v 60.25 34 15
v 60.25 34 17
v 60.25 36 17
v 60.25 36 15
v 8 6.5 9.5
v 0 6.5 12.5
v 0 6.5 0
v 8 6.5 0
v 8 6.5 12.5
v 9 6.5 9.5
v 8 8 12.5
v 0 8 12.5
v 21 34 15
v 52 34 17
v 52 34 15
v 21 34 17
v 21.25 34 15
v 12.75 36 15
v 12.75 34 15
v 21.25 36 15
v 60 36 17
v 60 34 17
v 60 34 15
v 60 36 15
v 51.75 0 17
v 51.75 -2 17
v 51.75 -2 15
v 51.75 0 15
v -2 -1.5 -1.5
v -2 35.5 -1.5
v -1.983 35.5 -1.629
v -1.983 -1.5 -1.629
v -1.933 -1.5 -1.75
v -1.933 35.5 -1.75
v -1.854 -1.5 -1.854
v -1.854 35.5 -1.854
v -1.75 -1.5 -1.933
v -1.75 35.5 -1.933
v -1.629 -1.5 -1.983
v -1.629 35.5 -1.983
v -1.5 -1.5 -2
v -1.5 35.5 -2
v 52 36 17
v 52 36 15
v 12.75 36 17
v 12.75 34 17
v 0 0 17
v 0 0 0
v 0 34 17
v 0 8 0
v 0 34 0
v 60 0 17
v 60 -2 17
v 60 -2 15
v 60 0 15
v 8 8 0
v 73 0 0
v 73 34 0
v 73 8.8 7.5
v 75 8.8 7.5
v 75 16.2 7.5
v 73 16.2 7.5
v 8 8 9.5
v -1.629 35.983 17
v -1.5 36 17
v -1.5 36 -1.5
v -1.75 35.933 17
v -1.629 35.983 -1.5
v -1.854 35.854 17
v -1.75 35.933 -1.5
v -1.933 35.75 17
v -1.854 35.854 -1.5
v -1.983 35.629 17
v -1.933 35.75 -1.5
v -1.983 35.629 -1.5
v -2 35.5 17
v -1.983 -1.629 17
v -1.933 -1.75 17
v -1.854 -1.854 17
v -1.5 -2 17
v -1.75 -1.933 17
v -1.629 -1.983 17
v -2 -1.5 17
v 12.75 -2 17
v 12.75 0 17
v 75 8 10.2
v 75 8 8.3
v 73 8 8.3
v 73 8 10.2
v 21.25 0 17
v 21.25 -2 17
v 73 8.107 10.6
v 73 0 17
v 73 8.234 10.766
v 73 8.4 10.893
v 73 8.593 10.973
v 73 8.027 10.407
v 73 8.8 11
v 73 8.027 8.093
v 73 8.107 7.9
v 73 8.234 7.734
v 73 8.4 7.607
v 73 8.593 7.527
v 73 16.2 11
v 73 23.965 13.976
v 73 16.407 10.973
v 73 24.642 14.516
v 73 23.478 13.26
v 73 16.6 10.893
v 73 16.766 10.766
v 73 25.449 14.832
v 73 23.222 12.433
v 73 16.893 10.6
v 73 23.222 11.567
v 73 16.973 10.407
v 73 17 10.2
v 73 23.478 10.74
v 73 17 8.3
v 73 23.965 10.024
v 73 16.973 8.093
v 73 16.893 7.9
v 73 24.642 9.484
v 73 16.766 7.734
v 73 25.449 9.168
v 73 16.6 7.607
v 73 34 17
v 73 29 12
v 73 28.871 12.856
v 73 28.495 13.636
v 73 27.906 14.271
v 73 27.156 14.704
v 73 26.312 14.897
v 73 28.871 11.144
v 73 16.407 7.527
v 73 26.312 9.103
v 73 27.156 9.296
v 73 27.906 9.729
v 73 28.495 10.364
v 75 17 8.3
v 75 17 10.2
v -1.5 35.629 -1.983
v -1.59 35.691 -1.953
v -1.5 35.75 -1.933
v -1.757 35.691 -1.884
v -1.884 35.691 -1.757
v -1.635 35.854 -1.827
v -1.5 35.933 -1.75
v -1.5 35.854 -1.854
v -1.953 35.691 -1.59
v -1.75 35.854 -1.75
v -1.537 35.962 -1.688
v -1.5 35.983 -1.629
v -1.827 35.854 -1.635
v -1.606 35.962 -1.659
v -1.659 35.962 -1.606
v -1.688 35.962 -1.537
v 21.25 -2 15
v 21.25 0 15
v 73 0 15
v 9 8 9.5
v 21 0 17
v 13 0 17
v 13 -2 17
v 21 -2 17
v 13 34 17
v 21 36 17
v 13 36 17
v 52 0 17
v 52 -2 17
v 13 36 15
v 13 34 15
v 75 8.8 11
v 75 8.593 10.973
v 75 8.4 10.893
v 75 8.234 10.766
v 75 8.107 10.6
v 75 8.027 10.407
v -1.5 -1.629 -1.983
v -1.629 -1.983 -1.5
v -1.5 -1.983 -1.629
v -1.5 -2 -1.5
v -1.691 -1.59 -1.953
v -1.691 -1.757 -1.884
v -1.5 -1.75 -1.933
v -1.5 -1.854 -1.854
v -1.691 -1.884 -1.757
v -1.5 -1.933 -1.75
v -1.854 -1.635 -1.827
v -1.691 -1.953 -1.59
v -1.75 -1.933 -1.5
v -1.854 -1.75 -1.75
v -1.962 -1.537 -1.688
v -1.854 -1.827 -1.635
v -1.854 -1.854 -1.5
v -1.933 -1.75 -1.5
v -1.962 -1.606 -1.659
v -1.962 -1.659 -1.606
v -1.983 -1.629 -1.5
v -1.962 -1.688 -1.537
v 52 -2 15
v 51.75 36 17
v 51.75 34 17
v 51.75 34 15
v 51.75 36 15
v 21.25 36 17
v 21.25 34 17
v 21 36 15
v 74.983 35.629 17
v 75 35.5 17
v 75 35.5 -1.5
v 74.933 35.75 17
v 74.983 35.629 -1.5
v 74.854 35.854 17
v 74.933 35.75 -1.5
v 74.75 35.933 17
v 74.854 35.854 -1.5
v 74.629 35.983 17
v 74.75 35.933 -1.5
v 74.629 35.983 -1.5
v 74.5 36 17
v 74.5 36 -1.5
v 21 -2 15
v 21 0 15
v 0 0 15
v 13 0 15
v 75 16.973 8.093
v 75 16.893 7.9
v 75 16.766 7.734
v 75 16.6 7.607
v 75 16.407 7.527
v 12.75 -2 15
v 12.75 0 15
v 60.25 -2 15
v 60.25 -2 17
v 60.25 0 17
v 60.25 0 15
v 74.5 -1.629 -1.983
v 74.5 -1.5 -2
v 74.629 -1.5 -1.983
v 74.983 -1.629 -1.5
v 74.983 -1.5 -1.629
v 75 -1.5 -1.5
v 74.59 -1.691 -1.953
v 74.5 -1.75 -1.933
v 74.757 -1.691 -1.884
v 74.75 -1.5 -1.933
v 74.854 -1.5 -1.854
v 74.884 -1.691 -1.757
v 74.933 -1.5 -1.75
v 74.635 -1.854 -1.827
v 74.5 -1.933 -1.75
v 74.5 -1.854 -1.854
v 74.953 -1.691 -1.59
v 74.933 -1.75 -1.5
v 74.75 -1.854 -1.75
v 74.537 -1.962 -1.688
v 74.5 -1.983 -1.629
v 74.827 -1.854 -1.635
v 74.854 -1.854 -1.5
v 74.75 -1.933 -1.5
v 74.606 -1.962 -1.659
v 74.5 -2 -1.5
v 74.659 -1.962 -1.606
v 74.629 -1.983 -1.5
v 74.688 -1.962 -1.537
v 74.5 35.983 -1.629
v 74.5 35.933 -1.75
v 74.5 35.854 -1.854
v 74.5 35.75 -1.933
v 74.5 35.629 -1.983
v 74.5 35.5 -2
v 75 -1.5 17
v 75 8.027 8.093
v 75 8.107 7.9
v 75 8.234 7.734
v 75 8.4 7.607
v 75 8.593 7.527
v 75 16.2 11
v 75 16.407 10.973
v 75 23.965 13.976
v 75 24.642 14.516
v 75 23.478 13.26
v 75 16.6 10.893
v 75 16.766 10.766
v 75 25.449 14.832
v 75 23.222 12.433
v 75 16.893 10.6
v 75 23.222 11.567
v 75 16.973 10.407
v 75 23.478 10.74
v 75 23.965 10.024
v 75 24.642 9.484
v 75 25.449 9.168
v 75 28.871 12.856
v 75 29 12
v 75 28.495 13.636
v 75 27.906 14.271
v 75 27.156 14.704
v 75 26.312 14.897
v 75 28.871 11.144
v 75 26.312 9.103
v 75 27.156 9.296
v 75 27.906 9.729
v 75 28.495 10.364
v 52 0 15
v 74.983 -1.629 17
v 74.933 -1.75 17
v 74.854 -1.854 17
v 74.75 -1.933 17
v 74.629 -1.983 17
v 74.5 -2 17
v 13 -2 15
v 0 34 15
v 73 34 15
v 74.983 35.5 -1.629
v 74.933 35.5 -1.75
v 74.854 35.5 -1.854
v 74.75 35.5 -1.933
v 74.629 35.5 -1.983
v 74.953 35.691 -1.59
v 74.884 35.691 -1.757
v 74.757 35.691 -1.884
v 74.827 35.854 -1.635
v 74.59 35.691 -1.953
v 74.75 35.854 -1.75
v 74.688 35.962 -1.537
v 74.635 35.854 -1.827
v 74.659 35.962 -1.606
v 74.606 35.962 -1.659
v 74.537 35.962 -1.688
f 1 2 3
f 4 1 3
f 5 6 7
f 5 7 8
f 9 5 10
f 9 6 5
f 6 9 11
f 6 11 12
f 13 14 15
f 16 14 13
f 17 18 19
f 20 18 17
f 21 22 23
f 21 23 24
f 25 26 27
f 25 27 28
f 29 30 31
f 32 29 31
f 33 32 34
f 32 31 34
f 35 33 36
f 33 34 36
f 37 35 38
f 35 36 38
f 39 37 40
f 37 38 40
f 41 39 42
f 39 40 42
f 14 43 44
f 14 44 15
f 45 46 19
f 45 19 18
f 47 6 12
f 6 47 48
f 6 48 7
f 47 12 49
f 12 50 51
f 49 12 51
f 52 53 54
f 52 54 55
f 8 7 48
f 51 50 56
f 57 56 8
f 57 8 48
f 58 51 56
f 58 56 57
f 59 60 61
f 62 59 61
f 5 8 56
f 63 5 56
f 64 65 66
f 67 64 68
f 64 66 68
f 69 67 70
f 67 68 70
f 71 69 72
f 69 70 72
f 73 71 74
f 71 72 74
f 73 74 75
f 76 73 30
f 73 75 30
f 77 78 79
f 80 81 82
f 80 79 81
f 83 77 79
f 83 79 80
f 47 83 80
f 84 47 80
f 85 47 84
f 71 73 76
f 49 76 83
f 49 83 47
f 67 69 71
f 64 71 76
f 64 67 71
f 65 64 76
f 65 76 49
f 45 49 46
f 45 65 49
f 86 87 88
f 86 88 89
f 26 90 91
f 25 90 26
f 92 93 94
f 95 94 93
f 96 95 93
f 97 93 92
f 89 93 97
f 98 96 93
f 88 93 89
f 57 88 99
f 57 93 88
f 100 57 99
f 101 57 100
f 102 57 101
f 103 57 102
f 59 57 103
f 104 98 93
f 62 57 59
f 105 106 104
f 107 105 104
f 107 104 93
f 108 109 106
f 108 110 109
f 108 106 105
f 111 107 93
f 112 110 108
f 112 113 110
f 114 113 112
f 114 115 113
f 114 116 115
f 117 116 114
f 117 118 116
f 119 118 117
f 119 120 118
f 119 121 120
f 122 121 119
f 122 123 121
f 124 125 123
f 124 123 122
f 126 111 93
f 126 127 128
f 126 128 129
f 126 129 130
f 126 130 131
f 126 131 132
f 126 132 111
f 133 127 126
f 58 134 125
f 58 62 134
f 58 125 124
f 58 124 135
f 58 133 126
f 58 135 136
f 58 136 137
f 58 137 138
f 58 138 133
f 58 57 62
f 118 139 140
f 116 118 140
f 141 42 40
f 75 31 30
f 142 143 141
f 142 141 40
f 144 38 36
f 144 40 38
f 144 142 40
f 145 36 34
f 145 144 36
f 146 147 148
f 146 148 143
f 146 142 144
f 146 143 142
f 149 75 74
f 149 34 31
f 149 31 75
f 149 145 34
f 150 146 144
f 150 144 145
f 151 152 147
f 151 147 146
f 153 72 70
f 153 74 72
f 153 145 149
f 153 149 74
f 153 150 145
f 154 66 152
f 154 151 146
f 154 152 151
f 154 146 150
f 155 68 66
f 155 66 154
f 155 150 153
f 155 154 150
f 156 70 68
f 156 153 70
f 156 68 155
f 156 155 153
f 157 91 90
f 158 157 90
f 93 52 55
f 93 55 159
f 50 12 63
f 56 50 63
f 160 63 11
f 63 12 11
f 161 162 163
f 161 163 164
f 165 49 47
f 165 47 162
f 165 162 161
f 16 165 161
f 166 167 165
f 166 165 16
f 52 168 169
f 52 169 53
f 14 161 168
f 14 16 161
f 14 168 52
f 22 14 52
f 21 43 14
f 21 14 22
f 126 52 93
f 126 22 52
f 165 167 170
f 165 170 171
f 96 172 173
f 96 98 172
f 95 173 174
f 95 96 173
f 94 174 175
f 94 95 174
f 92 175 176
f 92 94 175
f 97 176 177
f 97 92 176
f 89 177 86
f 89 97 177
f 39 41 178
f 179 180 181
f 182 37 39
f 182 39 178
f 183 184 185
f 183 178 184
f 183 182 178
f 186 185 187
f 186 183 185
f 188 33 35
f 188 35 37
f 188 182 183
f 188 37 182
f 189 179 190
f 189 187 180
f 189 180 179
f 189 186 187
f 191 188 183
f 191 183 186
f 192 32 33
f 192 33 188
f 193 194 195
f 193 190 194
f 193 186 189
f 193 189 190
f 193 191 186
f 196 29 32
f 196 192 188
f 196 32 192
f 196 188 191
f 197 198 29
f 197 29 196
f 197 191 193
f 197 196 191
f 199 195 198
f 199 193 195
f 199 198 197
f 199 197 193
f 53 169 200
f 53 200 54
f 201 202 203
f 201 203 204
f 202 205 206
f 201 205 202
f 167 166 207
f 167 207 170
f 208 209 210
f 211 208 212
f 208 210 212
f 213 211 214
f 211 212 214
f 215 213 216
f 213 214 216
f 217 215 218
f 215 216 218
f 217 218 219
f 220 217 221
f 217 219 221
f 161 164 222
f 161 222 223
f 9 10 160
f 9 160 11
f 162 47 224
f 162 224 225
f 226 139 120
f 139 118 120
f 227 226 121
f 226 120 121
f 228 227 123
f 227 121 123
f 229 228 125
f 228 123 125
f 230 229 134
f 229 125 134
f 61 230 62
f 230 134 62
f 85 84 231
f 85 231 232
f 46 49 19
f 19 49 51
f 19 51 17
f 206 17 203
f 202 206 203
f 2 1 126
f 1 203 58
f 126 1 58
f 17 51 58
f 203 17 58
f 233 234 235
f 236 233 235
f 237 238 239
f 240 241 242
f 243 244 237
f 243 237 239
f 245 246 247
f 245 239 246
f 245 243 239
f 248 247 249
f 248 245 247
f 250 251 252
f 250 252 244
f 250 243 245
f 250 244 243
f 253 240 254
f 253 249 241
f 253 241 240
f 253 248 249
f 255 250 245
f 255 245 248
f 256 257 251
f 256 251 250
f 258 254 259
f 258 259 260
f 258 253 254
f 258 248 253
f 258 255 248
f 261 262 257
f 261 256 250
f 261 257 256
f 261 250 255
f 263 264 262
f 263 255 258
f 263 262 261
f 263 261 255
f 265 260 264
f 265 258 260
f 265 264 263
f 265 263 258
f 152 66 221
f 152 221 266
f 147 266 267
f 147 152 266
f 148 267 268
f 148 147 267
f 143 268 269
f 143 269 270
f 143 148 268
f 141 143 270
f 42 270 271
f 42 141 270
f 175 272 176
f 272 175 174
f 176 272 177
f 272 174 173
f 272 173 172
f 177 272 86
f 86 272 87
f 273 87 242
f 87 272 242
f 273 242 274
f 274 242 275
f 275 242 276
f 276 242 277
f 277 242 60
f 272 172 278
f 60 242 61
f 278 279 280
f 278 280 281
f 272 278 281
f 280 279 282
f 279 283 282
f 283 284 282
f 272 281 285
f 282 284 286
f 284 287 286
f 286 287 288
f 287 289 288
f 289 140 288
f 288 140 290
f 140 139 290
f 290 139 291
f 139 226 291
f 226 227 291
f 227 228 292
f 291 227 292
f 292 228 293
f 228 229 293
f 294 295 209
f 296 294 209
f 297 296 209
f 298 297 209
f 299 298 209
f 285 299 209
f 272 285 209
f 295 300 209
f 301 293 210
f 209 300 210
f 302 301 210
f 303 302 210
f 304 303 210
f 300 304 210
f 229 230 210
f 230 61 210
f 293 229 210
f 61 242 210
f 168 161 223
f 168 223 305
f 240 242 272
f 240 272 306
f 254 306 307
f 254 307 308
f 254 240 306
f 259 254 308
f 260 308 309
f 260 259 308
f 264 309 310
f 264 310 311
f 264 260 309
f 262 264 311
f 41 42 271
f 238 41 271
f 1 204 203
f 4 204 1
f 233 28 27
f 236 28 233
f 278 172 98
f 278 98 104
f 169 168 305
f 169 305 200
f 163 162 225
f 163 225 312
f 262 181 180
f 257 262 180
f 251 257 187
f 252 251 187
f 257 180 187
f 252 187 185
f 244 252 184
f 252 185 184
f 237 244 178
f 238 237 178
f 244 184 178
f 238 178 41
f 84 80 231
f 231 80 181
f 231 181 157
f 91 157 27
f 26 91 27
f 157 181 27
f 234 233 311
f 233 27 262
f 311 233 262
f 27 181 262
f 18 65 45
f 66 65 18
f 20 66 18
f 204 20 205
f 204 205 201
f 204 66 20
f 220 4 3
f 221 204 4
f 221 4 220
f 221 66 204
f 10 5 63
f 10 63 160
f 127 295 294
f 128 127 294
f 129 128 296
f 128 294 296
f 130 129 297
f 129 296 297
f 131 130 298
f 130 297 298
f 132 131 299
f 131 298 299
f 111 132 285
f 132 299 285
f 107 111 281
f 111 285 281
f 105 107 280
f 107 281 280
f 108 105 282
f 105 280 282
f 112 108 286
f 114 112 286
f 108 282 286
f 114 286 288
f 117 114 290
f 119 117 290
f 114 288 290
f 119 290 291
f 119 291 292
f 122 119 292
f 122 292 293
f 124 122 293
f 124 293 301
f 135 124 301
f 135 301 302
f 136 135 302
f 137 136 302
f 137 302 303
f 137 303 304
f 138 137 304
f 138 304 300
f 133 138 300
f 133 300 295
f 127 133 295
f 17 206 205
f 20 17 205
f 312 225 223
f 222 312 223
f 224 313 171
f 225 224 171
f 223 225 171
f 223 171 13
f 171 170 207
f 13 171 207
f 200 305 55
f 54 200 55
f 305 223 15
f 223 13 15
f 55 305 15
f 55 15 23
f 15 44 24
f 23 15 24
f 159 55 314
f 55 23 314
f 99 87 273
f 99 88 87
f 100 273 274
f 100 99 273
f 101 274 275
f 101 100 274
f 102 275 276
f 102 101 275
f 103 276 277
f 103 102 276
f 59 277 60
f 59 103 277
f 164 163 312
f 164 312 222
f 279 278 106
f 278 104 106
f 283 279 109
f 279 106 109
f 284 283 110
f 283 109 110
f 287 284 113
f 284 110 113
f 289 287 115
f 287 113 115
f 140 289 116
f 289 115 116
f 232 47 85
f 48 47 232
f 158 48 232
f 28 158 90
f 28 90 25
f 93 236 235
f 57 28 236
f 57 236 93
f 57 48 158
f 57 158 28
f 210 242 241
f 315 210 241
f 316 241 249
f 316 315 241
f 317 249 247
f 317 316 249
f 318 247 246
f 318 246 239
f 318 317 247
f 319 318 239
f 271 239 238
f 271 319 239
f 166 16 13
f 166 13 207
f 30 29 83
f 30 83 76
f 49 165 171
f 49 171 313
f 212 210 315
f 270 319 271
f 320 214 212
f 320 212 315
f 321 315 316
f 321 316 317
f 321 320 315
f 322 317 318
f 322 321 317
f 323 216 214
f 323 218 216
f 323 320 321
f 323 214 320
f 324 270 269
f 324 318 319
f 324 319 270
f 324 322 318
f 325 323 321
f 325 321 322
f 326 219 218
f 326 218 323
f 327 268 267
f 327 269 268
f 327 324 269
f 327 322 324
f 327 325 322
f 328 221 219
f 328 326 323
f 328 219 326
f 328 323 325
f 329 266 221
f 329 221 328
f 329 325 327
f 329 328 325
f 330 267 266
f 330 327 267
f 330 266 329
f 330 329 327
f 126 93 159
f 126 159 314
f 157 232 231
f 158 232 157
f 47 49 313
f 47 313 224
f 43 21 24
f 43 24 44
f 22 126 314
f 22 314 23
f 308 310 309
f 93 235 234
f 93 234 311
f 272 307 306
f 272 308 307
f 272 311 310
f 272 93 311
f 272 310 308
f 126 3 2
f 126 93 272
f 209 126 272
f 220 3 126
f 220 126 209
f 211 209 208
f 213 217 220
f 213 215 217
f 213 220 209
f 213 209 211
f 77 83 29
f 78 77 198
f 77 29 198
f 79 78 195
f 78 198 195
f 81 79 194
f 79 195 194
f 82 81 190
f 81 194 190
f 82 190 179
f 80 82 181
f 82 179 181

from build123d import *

# Parameters (mm, degrees)
F0_W         = 73
F0_H         = 34
F1_DEPTH     = 17
F2_T         = 2
F3_W         = 9
F3_H         = 3.5
F4_DEPTH     = 25.4
F5_R         = 2.905
F6_DEPTH     = 25.4
F7_R         = 0.8
F8_T1_DEPTH  = 37
F8_T3_DEPTH  = 19.75
F8_T5_DEPTH  = 76
F8_S9_W      = 0.51
F8_S9_H      = 0.51
F8_T10_DEPTH = 0.51
F8_S15_W     = 0.51
F8_S15_H     = 0.51
F8_T16_DEPTH = 0.51
F8_S21_W     = 0.51
F8_S21_H     = 0.51
F8_T22_DEPTH = 0.51
F8_S27_W     = 0.51
F8_S27_H     = 0.51
F8_T28_DEPTH = 0.51
F9_W         = 8.5
F9_H         = 2
F10_DEPTH    = 2
F12_DEPTH    = 2
F13_W        = 8
F13_H        = 1.5
F14_DEPTH    = 9.5
F16_DEPTH    = 1.5


# Not quite as in the source:
# - a fillet or chamfer that OpenCascade refuses, or shapes differently, is made with other operations: its cross-section is extruded or revolved along the edge and cut away or added


with BuildPart() as f1:
    # F0 (on Top) → F1 (new body)
    with BuildSketch(Plane.XY):
        with Locations((36.5, 17)):
            Rectangle(F0_W, F0_H)
    extrude(amount=F1_DEPTH)

    # F2
    f2_openings = [f1.faces().sort_by_distance(p)[0] for p in [
        (36.5, 17, 17),
    ]]
    offset(amount=F2_T, openings=f2_openings, kind=Kind.INTERSECTION)

    # F3 (on face) → F4 (cut)
    with BuildSketch(Plane.YZ.offset(75)):
        with Locations((12.5, 9.25)):
            Rectangle(F3_W, F3_H)
    extrude(amount=-F4_DEPTH, mode=Mode.SUBTRACT)

    # F5 (on face) → F6 (cut)
    with BuildSketch(Plane.YZ.offset(75)):
        with Locations((26.095, 12)):
            Circle(F5_R)
    extrude(amount=-F6_DEPTH, mode=Mode.SUBTRACT)

    # F7
    f7_edges = [f1.edges().sort_by_distance(p)[0] for p in [
        (74, 8, 7.5),
        (74, 17, 11),
        (74, 17, 7.5),
        (74, 8, 11),
    ]]
    fillet(f7_edges, radius=F7_R)

    # F8: fillet of radius 0.5 on 9 edges, made by hand

    # F8_s2 → F8_t1 (cut)
    with BuildSketch(Plane.XZ.offset(-35.5)):
        with BuildLine():
            ThreePointArc((75, -1.5), (74.8535533906, -1.8535533906), (74.5, -2))
            Line((74.5, -2), (75, -2))
            Line((75, -2), (75, -1.5))
        make_face()
        with BuildLine():
            ThreePointArc((-2, -1.5), (-1.8535533906, -1.8535533906), (-1.5, -2))
            Line((-1.5, -2), (-2, -2))
            Line((-2, -2), (-2, -1.5))
        make_face()
    extrude(amount=F8_T1_DEPTH, mode=Mode.SUBTRACT)

    # F8_s4 → F8_t3 (cut)
    with BuildSketch(Plane.XY.offset(-1.5)):
        with BuildLine():
            ThreePointArc((75, -1.5), (74.8535533906, -1.8535533906), (74.5, -2))
            Line((74.5, -2), (75, -2))
            Line((75, -2), (75, -1.5))
        make_face()
        with BuildLine():
            ThreePointArc((75, 35.5), (74.8535533906, 35.8535533906), (74.5, 36))
            Line((74.5, 36), (75, 36))
            Line((75, 36), (75, 35.5))
        make_face()
        with BuildLine():
            ThreePointArc((-1.5, 36), (-1.8535533906, 35.8535533906), (-2, 35.5))
            Line((-2, 35.5), (-2, 36))
            Line((-2, 36), (-1.5, 36))
        make_face()
        with BuildLine():
            ThreePointArc((-2, -1.5), (-1.8535533906, -1.8535533906), (-1.5, -2))
            Line((-1.5, -2), (-2, -2))
            Line((-2, -2), (-2, -1.5))
        make_face()
    extrude(amount=F8_T3_DEPTH, mode=Mode.SUBTRACT)

    # F8_s6 → F8_t5 (cut)
    with BuildSketch(Plane.YZ.offset(-1.5)):
        with BuildLine():
            ThreePointArc((36, -1.5), (35.8535533906, -1.8535533906), (35.5, -2))
            Line((35.5, -2), (36, -2))
            Line((36, -2), (36, -1.5))
        make_face()
        with BuildLine():
            ThreePointArc((-2, -1.5), (-1.8535533906, -1.8535533906), (-1.5, -2))
            Line((-1.5, -2), (-2, -2))
            Line((-2, -2), (-2, -1.5))
        make_face()
    extrude(amount=F8_T5_DEPTH, mode=Mode.SUBTRACT)


with BuildPart() as f8_tool8:
    # F8_s9 → F8_t10 (new body)
    with BuildSketch(Plane.XZ.offset(1.5)):
        with Locations((74.755, -1.755)):
            Rectangle(F8_S9_W, F8_S9_H)
    extrude(amount=F8_T10_DEPTH)

    # F8_s11 → F8_t12 (revolve, cut)
    with BuildSketch(Plane(origin=(74.5, -1.5, -1.5), x_dir=(-0.7071067812, 0, 0.7071067812), z_dir=(0.7071067812, 0, 0.7071067812))):
        with BuildLine():
            ThreePointArc((0, -0.5), (0.5, 0), (0, 0.5))
            Line((0, 0.5), (0, -0.5))
        make_face()
    revolve(axis=Axis((74.5, -1.5, -1.5), (0, -1, 0)), mode=Mode.SUBTRACT)


with BuildPart() as f1_1:
    add(f1.part)

    # F8_t7: cut F8_tool8
    add(f8_tool8.part, mode=Mode.SUBTRACT)


with BuildPart() as f8_tool14:
    # F8_s15 → F8_t16 (new body)
    with BuildSketch(Plane.XZ.offset(-35.5)):
        with Locations((74.755, -1.755)):
            Rectangle(F8_S15_W, F8_S15_H)
    extrude(amount=-F8_T16_DEPTH)

    # F8_s17 → F8_t18 (revolve, cut)
    with BuildSketch(Plane(origin=(74.5, 35.5, -1.5), x_dir=(-0.7071067812, 0, 0.7071067812), z_dir=(-0.7071067812, 0, -0.7071067812))):
        with BuildLine():
            ThreePointArc((0, -0.5), (0.5, 0), (0, 0.5))
            Line((0, 0.5), (0, -0.5))
        make_face()
    revolve(axis=Axis((74.5, 35.5, -1.5), (0, 1, 0)), mode=Mode.SUBTRACT)


with BuildPart() as f1_2:
    add(f1_1.part)

    # F8_t13: cut F8_tool14
    add(f8_tool14.part, mode=Mode.SUBTRACT)


with BuildPart() as f8_tool20:
    # F8_s21 → F8_t22 (new body)
    with BuildSketch(Plane.XZ.offset(-35.5)):
        with Locations((-1.755, -1.755)):
            Rectangle(F8_S21_W, F8_S21_H)
    extrude(amount=-F8_T22_DEPTH)

    # F8_s23 → F8_t24 (revolve, cut)
    with BuildSketch(Plane(origin=(-1.5, 35.5, -1.5), x_dir=(0.7071067812, 0, 0.7071067812), z_dir=(-0.7071067812, 0, 0.7071067812))):
        with BuildLine():
            ThreePointArc((0, -0.5), (0.5, 0), (0, 0.5))
            Line((0, 0.5), (0, -0.5))
        make_face()
    revolve(axis=Axis((-1.5, 35.5, -1.5), (0, 1, 0)), mode=Mode.SUBTRACT)


with BuildPart() as f1_3:
    add(f1_2.part)

    # F8_t19: cut F8_tool20
    add(f8_tool20.part, mode=Mode.SUBTRACT)


with BuildPart() as f8_tool26:
    # F8_s27 → F8_t28 (new body)
    with BuildSketch(Plane.YZ.offset(-1.5)):
        with Locations((-1.755, -1.755)):
            Rectangle(F8_S27_W, F8_S27_H)
    extrude(amount=-F8_T28_DEPTH)

    # F8_s29 → F8_t30 (revolve, cut)
    with BuildSketch(Plane(origin=(-1.5, -1.5, -1.5), x_dir=(0, 0.7071067812, 0.7071067812), z_dir=(0, -0.7071067812, 0.7071067812))):
        with BuildLine():
            ThreePointArc((0, -0.5), (0.5, 0), (0, 0.5))
            Line((0, 0.5), (0, -0.5))
        make_face()
    revolve(axis=Axis((-1.5, -1.5, -1.5), (-1, 0, 0)), mode=Mode.SUBTRACT)


with BuildPart() as f1_4:
    add(f1_3.part)

    # F8_t25: cut F8_tool26
    add(f8_tool26.part, mode=Mode.SUBTRACT)

    # F9 (on face) → F10 (cut)
    with BuildSketch(Plane.XY.offset(17)):
        with Locations((17, 35)):
            Rectangle(F9_W, F9_H)
        with Locations((56, 35)):
            Rectangle(F9_W, F9_H)
        with Locations((56, -1)):
            Rectangle(F9_W, F9_H)
        with Locations((17, -1)):
            Rectangle(F9_W, F9_H)
    extrude(amount=-F10_DEPTH, mode=Mode.SUBTRACT)

    # F13 (on face) → F14 (join)
    with BuildSketch(Plane.XY):
        with Locations((4, 7.25)):
            Rectangle(F13_W, F13_H)
    extrude(amount=F14_DEPTH)

    # F15 (on face) → F16 (join)
    with BuildSketch(Plane.XZ.offset(-6.5)):
        Polygon((0, 12.5), (0, 9.5), (9, 9.5), (8, 12.5), align=None)
    extrude(amount=-F16_DEPTH)


with BuildPart() as f12:
    # F11 (on face) → F12 (new body)
    with BuildSketch(Plane.XY.offset(17)):
        Polygon((0, 34), (0, 0), (13, 0), (13, -2), (21, -2), (21, 0), (52, 0), (52, -2), (60, -2), (60, 0), (73, 0), (73, 34), (60, 34), (60, 36), (52, 36), (52, 34), (21, 34), (21, 36), (13, 36), (13, 34), align=None)
    extrude(amount=-F12_DEPTH)


solid = Compound([f1_4.part, f12.part])
